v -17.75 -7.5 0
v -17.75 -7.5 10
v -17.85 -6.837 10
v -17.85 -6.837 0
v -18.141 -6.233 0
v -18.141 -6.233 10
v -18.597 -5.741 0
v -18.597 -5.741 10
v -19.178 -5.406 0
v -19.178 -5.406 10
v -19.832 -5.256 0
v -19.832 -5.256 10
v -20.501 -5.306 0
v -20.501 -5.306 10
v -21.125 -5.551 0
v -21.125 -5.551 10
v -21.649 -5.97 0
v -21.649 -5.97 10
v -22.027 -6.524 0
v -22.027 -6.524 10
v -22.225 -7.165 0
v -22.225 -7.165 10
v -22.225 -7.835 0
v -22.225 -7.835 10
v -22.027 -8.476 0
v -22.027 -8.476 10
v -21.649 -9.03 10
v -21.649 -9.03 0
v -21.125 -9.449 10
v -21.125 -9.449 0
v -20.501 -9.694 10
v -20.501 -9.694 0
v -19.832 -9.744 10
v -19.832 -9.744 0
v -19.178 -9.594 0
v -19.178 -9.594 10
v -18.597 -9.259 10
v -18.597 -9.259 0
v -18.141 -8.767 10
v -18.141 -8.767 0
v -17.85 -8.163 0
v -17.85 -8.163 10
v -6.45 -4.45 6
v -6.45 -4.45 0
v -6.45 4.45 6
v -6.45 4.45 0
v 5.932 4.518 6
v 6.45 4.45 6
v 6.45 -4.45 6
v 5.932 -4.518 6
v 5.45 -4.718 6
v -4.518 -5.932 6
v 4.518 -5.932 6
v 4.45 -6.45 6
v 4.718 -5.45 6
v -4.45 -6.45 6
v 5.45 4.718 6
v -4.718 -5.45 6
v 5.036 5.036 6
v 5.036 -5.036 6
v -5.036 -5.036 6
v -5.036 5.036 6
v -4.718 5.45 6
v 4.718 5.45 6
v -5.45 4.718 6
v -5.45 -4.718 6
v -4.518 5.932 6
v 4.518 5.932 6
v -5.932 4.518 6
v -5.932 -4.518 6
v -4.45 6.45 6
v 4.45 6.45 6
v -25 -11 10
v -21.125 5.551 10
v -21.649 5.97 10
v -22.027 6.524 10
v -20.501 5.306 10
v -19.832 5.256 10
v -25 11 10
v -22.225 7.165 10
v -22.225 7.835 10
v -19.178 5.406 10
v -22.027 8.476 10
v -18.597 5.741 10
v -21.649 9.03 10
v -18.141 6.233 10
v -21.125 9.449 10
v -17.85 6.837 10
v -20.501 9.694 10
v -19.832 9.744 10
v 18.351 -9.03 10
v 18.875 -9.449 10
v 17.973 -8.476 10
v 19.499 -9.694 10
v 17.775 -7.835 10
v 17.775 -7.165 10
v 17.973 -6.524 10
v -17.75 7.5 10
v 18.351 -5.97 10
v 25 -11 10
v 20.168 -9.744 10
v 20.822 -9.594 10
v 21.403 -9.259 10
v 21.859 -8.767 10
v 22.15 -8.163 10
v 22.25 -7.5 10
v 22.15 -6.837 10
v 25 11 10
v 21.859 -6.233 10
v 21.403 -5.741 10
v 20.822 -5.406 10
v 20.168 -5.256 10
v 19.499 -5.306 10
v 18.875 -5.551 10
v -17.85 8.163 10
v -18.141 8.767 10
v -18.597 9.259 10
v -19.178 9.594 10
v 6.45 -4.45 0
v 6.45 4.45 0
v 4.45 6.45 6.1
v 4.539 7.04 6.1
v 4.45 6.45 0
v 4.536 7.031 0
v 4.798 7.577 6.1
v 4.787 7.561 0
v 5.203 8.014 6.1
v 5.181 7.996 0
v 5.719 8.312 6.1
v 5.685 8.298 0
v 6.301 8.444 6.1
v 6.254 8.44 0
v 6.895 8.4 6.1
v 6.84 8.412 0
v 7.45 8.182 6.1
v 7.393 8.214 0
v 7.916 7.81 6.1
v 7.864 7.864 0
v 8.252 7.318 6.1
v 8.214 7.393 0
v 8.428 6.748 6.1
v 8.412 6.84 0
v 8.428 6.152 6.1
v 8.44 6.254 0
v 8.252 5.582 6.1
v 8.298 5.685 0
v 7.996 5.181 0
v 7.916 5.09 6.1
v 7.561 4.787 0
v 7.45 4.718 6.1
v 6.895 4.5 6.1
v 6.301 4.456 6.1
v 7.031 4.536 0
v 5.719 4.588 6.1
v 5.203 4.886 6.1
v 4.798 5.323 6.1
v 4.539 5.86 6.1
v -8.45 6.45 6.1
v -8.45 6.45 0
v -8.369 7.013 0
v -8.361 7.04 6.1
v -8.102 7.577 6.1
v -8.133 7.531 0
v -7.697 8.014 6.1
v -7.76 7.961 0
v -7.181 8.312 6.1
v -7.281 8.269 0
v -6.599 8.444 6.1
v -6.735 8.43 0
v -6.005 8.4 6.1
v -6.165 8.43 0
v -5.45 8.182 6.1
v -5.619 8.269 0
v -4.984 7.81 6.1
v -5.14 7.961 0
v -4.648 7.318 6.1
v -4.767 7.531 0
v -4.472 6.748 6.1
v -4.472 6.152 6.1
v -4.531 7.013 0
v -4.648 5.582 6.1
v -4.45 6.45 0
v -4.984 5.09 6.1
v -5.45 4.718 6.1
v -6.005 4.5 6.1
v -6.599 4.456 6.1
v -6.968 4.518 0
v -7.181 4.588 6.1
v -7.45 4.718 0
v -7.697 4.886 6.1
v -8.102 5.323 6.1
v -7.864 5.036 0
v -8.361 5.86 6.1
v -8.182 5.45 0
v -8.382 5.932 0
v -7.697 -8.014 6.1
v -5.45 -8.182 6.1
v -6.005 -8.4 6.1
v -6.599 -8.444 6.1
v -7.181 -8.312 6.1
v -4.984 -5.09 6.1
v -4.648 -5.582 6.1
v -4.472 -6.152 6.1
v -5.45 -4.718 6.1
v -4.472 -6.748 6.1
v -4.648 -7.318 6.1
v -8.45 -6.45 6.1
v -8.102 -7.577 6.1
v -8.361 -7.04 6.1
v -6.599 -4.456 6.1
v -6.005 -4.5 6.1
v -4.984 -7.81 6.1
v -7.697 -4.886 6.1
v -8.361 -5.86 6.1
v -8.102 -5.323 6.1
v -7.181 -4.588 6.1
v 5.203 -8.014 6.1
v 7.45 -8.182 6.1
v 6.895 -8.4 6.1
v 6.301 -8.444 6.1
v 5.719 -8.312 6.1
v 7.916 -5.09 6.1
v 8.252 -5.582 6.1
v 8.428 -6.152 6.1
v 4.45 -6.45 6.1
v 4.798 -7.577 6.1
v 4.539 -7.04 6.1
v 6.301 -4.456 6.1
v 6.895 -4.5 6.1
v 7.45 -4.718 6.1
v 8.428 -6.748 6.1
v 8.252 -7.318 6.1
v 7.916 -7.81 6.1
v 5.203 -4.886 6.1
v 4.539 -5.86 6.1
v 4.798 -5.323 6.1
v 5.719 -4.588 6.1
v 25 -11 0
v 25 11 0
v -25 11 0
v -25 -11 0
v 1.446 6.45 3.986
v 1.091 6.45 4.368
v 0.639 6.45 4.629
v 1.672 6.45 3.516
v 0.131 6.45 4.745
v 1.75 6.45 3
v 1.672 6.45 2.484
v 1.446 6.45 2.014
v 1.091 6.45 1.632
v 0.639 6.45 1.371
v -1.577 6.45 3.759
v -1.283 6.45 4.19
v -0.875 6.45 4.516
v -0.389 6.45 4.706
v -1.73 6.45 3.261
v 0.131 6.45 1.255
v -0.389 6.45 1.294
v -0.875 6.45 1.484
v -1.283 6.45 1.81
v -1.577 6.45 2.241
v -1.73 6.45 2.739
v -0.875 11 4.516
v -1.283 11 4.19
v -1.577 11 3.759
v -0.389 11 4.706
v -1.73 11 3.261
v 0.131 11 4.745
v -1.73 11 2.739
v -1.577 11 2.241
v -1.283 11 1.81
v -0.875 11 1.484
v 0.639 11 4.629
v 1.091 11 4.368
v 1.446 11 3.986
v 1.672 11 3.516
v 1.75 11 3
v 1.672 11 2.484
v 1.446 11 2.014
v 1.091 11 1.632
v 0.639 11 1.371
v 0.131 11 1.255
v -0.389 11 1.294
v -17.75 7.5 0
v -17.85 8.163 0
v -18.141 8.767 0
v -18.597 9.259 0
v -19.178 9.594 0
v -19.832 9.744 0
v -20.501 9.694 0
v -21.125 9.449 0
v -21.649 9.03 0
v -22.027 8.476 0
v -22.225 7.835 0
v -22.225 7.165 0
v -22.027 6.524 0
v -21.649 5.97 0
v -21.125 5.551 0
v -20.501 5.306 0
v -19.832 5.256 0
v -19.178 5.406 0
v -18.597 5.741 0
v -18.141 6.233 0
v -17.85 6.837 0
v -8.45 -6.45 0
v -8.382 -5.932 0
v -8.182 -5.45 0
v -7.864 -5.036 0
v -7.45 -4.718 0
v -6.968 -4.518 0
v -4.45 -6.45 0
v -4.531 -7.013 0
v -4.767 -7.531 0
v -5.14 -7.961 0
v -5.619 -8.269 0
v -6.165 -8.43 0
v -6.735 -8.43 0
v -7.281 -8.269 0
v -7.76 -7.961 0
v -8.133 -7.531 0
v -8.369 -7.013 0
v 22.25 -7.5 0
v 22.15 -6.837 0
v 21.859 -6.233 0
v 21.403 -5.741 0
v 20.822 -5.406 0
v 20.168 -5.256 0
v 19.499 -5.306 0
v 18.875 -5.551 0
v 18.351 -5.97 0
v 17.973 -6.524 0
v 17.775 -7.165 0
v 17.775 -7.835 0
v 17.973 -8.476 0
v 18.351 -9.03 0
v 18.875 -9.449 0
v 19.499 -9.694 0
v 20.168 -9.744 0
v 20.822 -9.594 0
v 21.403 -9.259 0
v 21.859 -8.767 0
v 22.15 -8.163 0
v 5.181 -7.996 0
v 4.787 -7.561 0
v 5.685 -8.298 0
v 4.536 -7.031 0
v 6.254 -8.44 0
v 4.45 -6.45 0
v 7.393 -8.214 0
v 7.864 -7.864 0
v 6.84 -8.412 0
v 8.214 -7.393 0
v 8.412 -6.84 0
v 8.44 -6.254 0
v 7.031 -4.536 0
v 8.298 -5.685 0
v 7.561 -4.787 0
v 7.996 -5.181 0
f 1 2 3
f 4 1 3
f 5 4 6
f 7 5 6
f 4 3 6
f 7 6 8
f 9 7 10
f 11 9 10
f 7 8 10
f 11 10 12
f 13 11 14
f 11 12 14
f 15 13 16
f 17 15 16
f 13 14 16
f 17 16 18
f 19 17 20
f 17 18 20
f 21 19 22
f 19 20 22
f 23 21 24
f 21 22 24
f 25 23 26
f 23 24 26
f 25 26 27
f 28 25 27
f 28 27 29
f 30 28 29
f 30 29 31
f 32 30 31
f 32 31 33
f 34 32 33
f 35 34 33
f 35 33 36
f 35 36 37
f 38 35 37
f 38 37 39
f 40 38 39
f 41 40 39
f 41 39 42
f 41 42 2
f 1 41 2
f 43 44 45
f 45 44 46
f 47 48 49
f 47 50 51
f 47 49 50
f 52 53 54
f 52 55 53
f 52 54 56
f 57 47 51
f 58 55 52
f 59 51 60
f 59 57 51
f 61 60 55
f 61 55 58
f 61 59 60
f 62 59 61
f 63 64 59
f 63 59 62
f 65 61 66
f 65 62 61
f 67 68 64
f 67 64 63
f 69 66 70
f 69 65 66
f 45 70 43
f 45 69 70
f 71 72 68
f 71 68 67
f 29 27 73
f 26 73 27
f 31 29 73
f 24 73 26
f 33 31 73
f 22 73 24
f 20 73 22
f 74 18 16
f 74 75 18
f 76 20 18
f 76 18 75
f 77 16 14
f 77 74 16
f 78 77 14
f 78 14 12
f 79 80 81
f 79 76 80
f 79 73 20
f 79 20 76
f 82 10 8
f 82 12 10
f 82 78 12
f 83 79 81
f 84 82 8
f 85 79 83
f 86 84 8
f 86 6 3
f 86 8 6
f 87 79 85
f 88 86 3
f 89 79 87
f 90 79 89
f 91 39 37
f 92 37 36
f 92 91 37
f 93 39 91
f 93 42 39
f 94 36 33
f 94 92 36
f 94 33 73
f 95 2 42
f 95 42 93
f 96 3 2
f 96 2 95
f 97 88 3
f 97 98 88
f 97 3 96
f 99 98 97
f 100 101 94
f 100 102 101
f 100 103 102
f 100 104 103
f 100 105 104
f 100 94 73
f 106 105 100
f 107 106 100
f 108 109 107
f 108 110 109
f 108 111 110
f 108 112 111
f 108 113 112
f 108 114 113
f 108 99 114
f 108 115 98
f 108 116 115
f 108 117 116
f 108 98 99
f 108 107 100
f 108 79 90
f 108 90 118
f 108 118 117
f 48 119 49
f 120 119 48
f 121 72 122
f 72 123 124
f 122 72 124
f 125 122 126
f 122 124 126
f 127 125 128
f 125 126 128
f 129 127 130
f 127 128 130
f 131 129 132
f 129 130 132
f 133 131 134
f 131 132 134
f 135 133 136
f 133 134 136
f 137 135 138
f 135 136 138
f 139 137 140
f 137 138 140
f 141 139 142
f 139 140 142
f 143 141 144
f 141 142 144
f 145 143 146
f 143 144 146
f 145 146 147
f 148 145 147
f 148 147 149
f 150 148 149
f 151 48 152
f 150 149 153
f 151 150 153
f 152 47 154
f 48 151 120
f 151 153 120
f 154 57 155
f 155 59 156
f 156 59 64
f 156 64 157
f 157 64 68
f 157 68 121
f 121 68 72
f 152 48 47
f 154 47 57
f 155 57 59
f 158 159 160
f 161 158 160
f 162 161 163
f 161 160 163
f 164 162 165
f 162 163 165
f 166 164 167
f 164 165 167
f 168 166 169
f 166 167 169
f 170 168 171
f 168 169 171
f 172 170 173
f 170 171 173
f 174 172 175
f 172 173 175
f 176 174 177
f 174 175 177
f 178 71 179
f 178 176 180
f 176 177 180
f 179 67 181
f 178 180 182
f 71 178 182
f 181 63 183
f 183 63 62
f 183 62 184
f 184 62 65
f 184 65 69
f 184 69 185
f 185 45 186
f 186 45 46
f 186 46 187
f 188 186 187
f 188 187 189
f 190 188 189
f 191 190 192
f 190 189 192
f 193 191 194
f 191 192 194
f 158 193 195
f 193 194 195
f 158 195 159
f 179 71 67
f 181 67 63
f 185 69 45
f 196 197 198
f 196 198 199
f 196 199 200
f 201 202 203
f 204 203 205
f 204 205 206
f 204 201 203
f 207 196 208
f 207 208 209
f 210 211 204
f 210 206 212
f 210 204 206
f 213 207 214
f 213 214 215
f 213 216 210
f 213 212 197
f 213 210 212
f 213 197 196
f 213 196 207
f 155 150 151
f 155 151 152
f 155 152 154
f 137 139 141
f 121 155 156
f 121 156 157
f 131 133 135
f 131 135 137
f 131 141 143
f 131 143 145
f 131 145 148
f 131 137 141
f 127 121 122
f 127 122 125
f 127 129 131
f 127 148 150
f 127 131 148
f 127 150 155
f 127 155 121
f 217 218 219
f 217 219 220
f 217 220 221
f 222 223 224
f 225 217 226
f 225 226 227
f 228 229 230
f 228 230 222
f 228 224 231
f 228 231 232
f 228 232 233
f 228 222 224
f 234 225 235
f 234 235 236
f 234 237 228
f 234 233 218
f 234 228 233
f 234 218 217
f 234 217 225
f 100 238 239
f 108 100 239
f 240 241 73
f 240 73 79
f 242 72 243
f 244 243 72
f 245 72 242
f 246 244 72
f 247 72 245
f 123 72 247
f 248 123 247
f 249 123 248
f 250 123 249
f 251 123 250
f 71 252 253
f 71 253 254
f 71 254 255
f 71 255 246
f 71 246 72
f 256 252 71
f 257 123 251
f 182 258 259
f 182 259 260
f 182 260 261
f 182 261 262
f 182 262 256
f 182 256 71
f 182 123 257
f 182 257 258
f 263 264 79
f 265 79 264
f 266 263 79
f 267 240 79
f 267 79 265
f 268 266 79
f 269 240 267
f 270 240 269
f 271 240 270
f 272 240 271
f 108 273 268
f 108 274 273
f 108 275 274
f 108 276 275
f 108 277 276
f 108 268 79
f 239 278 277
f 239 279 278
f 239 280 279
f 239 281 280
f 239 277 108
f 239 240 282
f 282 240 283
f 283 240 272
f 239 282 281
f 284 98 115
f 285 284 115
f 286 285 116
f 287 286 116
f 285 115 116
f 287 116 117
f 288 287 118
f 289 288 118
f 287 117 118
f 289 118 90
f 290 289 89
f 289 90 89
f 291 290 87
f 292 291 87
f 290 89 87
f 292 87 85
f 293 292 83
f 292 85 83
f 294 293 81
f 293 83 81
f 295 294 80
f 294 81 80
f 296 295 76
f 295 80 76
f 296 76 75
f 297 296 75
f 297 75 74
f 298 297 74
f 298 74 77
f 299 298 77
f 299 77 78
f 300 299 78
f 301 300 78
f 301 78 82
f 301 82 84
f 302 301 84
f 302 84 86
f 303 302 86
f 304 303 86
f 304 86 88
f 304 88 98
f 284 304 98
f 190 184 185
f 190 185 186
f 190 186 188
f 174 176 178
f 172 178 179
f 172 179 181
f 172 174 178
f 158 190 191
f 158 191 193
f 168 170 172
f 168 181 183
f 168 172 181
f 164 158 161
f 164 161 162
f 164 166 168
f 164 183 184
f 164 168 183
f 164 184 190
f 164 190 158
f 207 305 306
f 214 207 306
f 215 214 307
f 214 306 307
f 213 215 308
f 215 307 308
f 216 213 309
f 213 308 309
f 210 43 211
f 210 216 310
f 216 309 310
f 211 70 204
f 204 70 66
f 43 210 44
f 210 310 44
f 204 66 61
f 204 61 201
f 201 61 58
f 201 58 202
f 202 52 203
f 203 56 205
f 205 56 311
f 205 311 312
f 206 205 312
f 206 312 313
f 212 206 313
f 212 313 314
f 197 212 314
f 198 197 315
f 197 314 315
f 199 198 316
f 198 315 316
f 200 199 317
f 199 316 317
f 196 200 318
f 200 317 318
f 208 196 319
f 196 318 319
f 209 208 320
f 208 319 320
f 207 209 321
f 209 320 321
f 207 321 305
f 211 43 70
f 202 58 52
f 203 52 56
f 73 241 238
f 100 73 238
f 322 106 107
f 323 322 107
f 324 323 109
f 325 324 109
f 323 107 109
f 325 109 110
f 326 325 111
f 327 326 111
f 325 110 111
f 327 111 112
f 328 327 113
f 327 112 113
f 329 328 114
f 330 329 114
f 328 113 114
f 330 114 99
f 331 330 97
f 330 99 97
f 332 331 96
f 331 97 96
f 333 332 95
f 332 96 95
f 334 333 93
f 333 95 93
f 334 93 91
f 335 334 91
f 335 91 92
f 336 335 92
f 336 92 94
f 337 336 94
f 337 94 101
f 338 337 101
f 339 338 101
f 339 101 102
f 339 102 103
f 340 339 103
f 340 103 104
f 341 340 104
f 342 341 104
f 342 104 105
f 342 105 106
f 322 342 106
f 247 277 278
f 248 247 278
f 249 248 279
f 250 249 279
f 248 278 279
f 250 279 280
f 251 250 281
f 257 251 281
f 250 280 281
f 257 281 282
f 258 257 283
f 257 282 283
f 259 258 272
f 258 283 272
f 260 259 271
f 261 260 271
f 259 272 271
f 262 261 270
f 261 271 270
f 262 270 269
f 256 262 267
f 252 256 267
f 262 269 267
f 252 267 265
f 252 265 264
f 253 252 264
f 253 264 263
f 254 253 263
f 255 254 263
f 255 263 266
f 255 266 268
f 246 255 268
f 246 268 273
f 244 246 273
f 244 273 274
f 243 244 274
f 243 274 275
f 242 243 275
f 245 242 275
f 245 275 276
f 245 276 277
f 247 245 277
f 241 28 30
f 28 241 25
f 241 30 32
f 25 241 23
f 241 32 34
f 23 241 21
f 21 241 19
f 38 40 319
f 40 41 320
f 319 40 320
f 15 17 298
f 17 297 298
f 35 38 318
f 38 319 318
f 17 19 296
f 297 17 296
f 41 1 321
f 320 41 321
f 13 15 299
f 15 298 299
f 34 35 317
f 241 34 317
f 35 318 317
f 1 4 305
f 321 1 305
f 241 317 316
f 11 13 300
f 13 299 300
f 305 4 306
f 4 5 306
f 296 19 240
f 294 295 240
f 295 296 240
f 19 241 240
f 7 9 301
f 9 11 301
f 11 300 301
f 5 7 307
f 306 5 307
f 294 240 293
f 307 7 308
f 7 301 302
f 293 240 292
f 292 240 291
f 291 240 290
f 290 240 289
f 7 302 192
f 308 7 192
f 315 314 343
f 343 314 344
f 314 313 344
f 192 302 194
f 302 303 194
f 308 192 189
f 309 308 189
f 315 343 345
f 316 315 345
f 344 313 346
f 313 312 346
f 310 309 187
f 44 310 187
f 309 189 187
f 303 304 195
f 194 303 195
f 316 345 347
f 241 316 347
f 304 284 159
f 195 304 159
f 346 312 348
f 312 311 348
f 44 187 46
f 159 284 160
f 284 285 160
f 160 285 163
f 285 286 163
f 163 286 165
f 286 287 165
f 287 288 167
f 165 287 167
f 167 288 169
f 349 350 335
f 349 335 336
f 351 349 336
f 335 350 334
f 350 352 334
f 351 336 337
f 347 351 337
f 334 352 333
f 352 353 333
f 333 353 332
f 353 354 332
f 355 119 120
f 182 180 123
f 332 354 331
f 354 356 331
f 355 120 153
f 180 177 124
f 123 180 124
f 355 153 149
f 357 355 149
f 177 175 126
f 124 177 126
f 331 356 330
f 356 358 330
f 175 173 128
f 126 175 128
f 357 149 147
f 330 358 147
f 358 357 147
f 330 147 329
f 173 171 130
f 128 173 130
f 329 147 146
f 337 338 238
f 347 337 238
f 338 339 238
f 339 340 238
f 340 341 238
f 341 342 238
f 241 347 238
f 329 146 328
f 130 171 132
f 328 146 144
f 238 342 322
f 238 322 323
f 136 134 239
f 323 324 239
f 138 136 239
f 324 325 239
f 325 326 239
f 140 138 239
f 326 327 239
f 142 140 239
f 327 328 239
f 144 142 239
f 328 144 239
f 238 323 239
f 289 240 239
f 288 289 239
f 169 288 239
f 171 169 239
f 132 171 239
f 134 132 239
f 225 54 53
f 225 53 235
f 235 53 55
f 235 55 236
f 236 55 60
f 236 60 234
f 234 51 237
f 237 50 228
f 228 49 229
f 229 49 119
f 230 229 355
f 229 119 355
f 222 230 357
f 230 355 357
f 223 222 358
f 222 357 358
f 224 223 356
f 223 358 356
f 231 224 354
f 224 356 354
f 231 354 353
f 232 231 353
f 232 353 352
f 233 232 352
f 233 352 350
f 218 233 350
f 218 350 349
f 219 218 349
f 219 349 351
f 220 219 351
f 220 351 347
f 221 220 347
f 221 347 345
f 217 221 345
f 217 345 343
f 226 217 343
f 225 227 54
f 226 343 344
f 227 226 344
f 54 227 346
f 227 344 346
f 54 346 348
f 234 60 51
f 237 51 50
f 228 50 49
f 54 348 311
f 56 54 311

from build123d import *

# Parameters (mm, degrees)
SKIZZE1_W                       = 50
SKIZZE1_H                       = 22
AUFSATZ_LINEAR_AUSTRAGEN1_DEPTH = 10
SKIZZE2_R                       = 2.25
SCHNITT_LINEAR_AUSTRAGEN1_DEPTH = 11
SKIZZE3_W                       = 12.9
SKIZZE3_H                       = 12.9
SCHNITT_LINEAR_AUSTRAGEN2_DEPTH = 6
SKIZZE4_R                       = 2
SCHNITT_LINEAR_AUSTRAGEN3_DEPTH = 6.1
SKIZZE5_R                       = 1.75
SCHNITT_LINEAR_AUSTRAGEN4_DEPTH = 6.1


with BuildPart() as part:
    # Skizze1 → Aufsatz-Linear austragen1 (new body)
    with BuildSketch(Plane.XY):
        Rectangle(SKIZZE1_W, SKIZZE1_H)
    extrude(amount=AUFSATZ_LINEAR_AUSTRAGEN1_DEPTH)

    # Skizze2 → Schnitt-Linear austragen1 (cut, through all)
    with BuildSketch(Plane.XY.offset(10)):
        with Locations((-20, 7.5)):
            Circle(SKIZZE2_R)
        with Locations((-20, -7.5)):
            Circle(SKIZZE2_R)
        with Locations((20, -7.5)):
            Circle(SKIZZE2_R)
    extrude(amount=-SCHNITT_LINEAR_AUSTRAGEN1_DEPTH, mode=Mode.SUBTRACT)

    # Skizze3 → Schnitt-Linear austragen2 (cut)
    with BuildSketch(Plane(origin=(0, 0, 0), x_dir=(-1, 0, 0), z_dir=(0, 0, -1))):
        Rectangle(SKIZZE3_W, SKIZZE3_H)
    extrude(amount=-SCHNITT_LINEAR_AUSTRAGEN2_DEPTH, mode=Mode.SUBTRACT)

    # Skizze4 → Schnitt-Linear austragen3 (cut)
    with BuildSketch(Plane(origin=(0, 0, 0), x_dir=(-1, 0, 0), z_dir=(0, 0, -1))):
        with Locations((-6.45, 6.45)):
            Circle(SKIZZE4_R)
        with Locations((6.45, 6.45)):
            Circle(SKIZZE4_R)
        with Locations((-6.45, -6.45)):
            Circle(SKIZZE4_R)
        with Locations((6.45, -6.45)):
            Circle(SKIZZE4_R)
    extrude(amount=-SCHNITT_LINEAR_AUSTRAGEN3_DEPTH, mode=Mode.SUBTRACT)

    # Skizze5 → Schnitt-Linear austragen4 (cut)
    with BuildSketch(Plane(origin=(0, 11, 0), x_dir=(1, 0, 0), z_dir=(0, 1, 0))):
        with Locations((0, -3)):
            Circle(SKIZZE5_R)
    extrude(amount=-SCHNITT_LINEAR_AUSTRAGEN4_DEPTH, mode=Mode.SUBTRACT)


solid = part.part
